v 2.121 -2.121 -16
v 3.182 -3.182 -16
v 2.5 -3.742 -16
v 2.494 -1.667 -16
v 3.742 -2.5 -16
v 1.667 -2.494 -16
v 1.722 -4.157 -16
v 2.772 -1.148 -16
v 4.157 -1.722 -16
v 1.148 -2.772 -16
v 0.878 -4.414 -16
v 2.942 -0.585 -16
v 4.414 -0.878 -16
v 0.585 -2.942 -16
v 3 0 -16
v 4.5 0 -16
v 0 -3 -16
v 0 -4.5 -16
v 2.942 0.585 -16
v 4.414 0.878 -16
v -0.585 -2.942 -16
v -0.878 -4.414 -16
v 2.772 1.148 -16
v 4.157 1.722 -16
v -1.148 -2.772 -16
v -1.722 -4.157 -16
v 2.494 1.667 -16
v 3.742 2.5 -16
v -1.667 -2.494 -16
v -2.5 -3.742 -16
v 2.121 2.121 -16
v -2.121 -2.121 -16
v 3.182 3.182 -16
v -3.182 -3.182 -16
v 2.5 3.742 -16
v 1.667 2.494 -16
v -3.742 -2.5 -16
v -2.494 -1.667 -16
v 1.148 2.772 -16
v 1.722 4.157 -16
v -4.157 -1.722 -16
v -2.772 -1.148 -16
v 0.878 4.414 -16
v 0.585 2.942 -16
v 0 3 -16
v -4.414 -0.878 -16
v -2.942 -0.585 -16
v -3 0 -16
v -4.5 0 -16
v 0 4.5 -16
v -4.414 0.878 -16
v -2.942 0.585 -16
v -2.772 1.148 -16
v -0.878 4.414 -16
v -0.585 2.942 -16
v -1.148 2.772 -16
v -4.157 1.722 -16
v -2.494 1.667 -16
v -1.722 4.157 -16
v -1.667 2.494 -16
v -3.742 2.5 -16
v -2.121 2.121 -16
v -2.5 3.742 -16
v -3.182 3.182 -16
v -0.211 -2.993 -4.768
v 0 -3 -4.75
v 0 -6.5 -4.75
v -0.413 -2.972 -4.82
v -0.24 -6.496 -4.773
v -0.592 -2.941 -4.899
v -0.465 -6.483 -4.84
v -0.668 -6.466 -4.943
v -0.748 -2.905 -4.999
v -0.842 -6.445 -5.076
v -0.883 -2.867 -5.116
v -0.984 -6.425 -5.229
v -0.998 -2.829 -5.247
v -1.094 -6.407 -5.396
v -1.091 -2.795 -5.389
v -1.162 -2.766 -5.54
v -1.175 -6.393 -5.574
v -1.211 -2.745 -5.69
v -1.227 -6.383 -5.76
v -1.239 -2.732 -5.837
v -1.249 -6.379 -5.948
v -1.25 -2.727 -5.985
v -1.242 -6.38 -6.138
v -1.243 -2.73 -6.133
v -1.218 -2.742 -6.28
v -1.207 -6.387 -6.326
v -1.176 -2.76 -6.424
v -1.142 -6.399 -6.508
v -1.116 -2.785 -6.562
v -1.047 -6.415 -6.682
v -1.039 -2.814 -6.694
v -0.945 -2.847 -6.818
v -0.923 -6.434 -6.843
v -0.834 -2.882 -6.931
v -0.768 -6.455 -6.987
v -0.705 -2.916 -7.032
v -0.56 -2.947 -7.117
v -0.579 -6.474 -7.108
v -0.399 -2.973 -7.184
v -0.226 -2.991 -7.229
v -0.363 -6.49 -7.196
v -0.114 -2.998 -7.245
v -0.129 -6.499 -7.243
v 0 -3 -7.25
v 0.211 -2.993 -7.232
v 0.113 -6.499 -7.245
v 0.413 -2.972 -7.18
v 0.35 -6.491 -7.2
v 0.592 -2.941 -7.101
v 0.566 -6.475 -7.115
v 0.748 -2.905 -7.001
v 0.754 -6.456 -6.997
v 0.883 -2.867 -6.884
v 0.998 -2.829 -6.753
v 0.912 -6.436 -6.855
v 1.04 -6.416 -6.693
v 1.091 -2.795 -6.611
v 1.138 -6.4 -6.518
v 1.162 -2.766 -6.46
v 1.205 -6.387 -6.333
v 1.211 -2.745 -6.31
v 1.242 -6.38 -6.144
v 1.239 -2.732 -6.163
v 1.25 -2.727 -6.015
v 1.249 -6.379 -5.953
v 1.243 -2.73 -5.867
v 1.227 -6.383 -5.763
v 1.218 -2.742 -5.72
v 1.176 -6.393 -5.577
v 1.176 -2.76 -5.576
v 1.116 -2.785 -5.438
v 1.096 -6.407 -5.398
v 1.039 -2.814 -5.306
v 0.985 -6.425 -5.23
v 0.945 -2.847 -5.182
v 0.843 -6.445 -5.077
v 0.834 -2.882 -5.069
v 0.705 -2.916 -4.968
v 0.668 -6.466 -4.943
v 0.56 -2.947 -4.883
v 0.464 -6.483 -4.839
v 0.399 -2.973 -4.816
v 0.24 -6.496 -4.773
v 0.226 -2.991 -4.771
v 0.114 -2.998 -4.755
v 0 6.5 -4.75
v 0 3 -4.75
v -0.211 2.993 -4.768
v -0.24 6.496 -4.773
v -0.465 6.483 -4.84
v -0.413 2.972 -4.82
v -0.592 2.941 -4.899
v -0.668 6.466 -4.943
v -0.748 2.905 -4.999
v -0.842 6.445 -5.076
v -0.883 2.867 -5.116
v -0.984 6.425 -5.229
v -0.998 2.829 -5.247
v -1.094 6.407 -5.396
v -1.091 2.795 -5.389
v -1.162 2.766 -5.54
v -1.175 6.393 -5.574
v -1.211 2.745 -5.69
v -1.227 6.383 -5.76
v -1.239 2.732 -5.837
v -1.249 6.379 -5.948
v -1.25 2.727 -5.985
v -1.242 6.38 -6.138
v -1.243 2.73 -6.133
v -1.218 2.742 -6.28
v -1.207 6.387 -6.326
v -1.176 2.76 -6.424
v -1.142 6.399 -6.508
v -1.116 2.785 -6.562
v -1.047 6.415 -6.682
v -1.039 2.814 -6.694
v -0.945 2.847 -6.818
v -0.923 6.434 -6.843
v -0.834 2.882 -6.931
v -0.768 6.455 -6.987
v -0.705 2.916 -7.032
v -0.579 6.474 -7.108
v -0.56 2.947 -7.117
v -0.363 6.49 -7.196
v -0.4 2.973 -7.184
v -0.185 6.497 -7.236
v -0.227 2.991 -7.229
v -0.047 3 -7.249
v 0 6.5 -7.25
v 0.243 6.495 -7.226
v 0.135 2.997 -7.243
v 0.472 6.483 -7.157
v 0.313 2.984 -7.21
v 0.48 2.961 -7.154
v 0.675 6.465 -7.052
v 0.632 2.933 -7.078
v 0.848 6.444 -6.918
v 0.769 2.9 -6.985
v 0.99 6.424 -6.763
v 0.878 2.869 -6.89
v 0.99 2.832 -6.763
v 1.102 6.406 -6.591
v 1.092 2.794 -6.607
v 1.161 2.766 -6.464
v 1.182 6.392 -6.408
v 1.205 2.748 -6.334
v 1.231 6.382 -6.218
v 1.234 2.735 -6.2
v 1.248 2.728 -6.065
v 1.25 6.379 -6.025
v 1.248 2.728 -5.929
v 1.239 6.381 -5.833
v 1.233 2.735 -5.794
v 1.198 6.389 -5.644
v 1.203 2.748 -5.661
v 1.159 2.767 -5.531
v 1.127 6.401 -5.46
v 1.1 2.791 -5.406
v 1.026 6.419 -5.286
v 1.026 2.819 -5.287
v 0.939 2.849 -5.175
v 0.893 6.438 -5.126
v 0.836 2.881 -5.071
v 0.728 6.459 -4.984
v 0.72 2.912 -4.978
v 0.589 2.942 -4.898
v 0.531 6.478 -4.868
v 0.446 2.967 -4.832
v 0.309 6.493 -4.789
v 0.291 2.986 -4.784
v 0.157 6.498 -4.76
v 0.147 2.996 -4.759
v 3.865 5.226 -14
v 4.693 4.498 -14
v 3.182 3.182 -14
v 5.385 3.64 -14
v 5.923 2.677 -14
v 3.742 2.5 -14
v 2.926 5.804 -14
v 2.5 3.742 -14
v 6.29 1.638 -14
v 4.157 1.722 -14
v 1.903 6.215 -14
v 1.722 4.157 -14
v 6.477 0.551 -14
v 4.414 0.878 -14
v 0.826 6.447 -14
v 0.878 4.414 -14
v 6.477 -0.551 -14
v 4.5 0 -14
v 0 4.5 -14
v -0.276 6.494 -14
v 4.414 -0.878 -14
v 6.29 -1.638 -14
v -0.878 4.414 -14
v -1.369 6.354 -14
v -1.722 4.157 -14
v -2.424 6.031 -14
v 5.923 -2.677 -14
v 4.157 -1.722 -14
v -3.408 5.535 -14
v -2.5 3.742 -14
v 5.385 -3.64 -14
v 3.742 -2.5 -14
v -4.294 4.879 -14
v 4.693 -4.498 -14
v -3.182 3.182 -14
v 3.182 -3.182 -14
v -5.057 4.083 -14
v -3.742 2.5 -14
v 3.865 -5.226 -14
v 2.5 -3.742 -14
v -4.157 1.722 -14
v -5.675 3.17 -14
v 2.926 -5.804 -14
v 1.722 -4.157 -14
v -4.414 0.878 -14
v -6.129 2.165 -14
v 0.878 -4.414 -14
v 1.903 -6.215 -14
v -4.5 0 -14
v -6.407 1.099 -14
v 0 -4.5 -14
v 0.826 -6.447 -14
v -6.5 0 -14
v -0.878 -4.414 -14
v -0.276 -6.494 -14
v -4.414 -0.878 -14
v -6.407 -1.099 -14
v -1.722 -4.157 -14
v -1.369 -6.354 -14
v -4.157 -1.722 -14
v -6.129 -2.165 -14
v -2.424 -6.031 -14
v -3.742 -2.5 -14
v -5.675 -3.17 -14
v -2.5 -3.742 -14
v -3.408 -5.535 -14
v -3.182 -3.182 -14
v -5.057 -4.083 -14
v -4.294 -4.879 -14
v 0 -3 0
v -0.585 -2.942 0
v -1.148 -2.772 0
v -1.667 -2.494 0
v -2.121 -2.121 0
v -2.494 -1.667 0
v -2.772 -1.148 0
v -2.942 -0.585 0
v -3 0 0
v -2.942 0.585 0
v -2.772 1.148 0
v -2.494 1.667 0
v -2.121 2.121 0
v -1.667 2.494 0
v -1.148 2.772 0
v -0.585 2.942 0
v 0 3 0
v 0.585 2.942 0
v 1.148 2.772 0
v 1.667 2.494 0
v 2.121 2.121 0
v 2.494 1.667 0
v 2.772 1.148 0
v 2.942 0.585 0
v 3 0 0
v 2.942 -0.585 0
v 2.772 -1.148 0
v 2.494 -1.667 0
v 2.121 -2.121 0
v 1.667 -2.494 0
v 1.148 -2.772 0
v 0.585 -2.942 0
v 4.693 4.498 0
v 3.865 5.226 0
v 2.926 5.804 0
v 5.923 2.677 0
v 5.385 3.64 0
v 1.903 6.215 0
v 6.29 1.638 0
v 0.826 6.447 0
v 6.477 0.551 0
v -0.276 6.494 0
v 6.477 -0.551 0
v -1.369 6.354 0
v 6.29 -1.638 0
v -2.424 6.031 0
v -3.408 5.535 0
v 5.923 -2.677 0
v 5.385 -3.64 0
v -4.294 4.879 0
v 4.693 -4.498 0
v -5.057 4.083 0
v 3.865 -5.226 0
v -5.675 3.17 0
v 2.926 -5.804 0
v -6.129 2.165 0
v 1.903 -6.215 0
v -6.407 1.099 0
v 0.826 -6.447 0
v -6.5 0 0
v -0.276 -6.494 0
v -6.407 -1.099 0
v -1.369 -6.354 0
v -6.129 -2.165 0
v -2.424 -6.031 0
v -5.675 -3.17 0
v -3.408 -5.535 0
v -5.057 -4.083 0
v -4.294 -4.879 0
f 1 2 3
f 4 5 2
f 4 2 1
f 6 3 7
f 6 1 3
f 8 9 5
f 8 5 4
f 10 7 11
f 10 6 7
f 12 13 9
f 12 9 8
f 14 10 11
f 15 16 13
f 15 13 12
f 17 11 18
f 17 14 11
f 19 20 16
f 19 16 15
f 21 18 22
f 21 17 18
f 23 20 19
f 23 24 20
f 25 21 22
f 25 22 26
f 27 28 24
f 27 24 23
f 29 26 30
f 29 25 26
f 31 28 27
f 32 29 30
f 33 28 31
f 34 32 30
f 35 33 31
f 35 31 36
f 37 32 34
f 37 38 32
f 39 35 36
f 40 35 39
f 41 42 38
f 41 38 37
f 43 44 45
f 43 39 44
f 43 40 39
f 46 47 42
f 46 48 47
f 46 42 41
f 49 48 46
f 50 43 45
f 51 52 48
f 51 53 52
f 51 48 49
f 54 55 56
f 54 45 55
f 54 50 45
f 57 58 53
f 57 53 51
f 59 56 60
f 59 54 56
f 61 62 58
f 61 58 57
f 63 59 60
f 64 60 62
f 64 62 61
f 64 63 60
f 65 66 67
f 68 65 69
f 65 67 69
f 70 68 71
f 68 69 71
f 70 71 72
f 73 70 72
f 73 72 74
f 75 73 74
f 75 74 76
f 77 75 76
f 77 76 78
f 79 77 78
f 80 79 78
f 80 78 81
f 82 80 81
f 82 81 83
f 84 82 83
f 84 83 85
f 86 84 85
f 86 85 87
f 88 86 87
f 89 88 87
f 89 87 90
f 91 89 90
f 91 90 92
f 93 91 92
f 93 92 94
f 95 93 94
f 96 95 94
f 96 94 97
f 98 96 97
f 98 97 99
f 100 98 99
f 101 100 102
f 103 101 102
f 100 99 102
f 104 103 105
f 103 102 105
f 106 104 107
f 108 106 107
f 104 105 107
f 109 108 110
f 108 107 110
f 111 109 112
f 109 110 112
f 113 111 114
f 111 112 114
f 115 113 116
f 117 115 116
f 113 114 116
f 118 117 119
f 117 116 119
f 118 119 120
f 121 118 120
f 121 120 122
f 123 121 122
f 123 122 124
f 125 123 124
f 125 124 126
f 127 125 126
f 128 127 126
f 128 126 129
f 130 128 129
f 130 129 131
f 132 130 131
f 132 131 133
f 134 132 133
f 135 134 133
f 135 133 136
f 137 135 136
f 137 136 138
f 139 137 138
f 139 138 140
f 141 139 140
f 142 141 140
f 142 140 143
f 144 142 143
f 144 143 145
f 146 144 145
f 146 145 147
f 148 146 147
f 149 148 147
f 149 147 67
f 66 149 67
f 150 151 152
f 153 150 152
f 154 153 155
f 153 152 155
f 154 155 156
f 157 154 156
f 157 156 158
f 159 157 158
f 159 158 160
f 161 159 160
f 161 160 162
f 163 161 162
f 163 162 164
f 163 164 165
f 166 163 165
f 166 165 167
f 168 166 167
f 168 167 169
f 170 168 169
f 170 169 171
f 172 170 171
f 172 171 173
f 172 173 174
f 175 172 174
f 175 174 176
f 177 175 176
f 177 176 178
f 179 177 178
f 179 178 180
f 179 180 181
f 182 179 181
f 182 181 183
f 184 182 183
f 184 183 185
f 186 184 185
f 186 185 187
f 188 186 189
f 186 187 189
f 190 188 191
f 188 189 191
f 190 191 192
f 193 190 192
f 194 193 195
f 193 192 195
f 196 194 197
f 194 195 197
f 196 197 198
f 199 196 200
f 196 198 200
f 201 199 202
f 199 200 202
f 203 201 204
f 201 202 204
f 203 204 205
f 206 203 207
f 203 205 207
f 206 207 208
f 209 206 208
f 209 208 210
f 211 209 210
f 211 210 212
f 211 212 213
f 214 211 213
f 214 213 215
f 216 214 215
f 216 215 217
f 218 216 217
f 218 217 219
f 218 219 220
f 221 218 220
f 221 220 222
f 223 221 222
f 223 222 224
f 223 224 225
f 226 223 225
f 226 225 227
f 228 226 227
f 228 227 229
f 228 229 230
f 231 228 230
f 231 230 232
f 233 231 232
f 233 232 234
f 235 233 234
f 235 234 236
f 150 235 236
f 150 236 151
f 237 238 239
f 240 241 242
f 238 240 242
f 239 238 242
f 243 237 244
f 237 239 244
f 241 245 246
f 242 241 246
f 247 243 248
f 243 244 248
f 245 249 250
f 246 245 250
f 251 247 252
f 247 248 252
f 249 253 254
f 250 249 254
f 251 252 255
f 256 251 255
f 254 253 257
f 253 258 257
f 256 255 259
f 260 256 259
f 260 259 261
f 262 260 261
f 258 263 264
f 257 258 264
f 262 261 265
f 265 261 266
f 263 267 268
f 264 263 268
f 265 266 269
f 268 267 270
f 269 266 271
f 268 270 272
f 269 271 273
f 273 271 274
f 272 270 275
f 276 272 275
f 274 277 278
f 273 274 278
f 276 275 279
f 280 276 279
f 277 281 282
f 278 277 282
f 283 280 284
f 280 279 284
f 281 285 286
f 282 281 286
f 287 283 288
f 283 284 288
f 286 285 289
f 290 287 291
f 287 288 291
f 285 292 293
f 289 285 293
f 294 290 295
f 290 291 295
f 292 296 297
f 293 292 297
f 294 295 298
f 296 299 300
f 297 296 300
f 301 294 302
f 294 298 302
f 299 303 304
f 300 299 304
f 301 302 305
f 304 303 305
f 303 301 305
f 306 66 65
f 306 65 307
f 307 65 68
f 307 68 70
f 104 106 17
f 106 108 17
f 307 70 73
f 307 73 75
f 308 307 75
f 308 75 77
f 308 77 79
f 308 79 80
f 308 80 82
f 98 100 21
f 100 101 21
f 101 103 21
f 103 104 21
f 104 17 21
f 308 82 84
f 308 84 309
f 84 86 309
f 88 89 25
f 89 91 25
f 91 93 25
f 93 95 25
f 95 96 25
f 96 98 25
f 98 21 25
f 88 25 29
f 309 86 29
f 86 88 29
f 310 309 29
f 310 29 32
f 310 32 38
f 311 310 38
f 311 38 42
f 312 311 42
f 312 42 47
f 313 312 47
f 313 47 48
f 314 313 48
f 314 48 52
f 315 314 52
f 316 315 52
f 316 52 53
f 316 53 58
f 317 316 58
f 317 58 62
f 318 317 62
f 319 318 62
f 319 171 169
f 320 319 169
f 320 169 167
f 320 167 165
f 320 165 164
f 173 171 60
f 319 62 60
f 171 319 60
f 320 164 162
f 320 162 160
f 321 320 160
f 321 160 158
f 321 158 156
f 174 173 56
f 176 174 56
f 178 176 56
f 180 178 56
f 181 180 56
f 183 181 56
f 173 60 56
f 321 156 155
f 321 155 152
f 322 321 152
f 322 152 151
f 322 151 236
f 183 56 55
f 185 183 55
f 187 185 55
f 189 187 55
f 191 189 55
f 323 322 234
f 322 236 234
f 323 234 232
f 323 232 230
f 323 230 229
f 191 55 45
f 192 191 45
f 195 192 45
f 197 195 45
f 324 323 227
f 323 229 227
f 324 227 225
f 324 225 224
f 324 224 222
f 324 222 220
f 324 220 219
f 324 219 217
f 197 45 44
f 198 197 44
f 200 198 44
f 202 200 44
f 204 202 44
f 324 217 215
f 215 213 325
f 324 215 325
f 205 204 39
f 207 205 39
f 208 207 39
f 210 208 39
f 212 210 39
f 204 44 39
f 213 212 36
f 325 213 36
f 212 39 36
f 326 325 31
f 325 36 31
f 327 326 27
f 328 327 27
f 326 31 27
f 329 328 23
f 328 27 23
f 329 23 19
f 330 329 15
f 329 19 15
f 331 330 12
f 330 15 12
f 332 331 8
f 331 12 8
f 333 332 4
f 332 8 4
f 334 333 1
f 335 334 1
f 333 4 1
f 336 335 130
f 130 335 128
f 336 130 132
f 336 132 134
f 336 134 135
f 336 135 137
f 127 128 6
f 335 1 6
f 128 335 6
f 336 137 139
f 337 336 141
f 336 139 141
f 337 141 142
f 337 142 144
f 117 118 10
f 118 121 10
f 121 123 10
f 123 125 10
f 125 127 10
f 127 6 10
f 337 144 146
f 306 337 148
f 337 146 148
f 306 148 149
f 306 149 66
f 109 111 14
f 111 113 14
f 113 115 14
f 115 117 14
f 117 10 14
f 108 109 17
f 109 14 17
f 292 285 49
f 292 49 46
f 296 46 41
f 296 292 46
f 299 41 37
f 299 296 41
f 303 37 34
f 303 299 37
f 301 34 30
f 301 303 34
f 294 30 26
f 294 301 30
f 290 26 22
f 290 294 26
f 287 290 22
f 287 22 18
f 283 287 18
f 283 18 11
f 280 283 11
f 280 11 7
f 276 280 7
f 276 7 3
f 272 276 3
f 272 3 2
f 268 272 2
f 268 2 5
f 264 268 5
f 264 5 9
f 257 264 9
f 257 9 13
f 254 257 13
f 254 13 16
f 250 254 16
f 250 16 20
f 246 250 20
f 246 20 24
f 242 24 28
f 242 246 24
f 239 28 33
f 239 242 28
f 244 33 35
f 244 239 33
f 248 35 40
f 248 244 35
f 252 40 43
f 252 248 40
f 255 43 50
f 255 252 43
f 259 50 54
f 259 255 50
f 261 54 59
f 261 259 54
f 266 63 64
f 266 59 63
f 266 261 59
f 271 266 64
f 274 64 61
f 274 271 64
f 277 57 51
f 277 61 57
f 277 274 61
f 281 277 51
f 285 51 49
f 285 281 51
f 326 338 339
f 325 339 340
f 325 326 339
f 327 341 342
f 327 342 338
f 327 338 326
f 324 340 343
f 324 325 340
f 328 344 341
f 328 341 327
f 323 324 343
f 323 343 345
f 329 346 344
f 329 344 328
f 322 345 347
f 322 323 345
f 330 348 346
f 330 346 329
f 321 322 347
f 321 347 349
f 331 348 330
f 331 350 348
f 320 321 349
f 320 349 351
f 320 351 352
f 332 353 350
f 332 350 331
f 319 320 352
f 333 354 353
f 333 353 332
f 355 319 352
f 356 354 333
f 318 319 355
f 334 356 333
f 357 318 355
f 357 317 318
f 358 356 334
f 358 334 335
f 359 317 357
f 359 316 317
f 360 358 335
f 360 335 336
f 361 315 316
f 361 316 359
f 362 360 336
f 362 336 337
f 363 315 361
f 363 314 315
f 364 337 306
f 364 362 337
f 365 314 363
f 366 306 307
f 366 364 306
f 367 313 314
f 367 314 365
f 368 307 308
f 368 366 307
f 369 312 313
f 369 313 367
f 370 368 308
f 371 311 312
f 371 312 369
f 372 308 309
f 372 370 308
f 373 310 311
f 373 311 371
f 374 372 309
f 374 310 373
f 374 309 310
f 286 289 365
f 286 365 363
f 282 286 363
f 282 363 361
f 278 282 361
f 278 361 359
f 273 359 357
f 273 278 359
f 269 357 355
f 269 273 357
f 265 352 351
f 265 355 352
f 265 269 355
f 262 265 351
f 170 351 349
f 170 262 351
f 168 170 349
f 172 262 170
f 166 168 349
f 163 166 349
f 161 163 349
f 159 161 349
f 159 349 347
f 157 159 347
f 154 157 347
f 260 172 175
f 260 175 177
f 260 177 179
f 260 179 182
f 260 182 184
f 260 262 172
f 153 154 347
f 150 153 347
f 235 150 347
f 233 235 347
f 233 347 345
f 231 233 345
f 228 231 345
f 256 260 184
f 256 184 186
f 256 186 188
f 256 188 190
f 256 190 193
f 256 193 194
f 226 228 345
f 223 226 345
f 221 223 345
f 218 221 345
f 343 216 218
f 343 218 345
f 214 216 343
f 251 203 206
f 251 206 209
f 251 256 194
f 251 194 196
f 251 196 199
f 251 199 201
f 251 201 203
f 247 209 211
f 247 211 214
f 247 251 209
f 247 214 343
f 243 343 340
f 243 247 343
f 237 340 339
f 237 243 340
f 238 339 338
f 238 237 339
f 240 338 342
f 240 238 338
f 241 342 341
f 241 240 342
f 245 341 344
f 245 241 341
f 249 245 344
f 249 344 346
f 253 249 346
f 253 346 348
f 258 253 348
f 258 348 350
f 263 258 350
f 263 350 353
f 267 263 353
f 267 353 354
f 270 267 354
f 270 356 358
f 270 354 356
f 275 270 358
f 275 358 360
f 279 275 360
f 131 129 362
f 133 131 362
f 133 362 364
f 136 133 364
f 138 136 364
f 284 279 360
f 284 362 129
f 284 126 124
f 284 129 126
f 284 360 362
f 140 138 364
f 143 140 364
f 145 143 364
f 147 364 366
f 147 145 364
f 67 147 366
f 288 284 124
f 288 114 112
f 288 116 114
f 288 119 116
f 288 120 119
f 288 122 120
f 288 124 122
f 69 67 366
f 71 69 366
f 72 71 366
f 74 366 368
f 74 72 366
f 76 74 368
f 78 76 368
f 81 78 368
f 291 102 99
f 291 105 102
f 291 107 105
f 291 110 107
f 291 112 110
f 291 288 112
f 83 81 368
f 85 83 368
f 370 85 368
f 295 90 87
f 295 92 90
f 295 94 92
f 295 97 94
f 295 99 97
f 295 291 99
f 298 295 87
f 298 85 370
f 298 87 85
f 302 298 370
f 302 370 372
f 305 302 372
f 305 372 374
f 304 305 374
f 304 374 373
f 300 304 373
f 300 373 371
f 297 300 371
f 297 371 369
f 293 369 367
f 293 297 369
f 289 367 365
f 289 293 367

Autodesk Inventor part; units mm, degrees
ref_plane "YZ Plane" through (0, 0, 0) normal (1, 0, 0) x (0, 1, 0)
ref_plane "XY Plane" through (0, 0, 0) normal (0, 0, 1) x (1, 0, 0)
sketch "Skizze1" plane through (0, 0, 0) normal (0, 1, 0) x (-1, 0, 0)
  line L0 (0, 0) -> (6.5, 0)
  line L1 (6.5, 0) -> (6.5, -14)
  line L2 (6.5, -14) -> (0, -14)
  line L3 (0, -14) -> (0, 0)
  point P0 (6.5, -7)
  dimension "d0" = 13
  dimension "d1" = 14
revolve "Umdrehung1" add sketch "Skizze1" angle 360 about axis through (0, 0, -14) along (0, 0, 1)
ref_plane "Arbeitsebene1" through (0, 6.5, 0) normal (0, 1, 0) x (-1, 0, 0)
sketch "Skizze3" plane through (0, 6.5, 0) normal (0, 1, 0) x (-1, 0, 0)
  point P0 (0, 0)
  point P1 (0, -6)
  dimension "d11" = 6
hole "Bohrung2" at (0, 6.5, -6) direction (0, -1, 0) diameter 2.5 end through all
sketch "Skizze6" plane through (0, 0, -14) normal (0, 0, -1) x (-1, 0, 0)
  circle A0 centre (0, 0) radius 4.5
  point P0 (0, 0)
extrude "Extrusion1" add sketch "Skizze6" along normal blind 2
sketch "Skizze4" plane through (0, 0, 0) normal (0, 0, 1) x (1, 0, 0)
  circle A0 centre (0, 0) radius 6.5 projected
  point P0 (0, 0)
hole "Bohrung3" at (0, 0, 0) direction (0, 0, -1) diameter 6 end through all
properties part number "205 part 2" material "Gold"
